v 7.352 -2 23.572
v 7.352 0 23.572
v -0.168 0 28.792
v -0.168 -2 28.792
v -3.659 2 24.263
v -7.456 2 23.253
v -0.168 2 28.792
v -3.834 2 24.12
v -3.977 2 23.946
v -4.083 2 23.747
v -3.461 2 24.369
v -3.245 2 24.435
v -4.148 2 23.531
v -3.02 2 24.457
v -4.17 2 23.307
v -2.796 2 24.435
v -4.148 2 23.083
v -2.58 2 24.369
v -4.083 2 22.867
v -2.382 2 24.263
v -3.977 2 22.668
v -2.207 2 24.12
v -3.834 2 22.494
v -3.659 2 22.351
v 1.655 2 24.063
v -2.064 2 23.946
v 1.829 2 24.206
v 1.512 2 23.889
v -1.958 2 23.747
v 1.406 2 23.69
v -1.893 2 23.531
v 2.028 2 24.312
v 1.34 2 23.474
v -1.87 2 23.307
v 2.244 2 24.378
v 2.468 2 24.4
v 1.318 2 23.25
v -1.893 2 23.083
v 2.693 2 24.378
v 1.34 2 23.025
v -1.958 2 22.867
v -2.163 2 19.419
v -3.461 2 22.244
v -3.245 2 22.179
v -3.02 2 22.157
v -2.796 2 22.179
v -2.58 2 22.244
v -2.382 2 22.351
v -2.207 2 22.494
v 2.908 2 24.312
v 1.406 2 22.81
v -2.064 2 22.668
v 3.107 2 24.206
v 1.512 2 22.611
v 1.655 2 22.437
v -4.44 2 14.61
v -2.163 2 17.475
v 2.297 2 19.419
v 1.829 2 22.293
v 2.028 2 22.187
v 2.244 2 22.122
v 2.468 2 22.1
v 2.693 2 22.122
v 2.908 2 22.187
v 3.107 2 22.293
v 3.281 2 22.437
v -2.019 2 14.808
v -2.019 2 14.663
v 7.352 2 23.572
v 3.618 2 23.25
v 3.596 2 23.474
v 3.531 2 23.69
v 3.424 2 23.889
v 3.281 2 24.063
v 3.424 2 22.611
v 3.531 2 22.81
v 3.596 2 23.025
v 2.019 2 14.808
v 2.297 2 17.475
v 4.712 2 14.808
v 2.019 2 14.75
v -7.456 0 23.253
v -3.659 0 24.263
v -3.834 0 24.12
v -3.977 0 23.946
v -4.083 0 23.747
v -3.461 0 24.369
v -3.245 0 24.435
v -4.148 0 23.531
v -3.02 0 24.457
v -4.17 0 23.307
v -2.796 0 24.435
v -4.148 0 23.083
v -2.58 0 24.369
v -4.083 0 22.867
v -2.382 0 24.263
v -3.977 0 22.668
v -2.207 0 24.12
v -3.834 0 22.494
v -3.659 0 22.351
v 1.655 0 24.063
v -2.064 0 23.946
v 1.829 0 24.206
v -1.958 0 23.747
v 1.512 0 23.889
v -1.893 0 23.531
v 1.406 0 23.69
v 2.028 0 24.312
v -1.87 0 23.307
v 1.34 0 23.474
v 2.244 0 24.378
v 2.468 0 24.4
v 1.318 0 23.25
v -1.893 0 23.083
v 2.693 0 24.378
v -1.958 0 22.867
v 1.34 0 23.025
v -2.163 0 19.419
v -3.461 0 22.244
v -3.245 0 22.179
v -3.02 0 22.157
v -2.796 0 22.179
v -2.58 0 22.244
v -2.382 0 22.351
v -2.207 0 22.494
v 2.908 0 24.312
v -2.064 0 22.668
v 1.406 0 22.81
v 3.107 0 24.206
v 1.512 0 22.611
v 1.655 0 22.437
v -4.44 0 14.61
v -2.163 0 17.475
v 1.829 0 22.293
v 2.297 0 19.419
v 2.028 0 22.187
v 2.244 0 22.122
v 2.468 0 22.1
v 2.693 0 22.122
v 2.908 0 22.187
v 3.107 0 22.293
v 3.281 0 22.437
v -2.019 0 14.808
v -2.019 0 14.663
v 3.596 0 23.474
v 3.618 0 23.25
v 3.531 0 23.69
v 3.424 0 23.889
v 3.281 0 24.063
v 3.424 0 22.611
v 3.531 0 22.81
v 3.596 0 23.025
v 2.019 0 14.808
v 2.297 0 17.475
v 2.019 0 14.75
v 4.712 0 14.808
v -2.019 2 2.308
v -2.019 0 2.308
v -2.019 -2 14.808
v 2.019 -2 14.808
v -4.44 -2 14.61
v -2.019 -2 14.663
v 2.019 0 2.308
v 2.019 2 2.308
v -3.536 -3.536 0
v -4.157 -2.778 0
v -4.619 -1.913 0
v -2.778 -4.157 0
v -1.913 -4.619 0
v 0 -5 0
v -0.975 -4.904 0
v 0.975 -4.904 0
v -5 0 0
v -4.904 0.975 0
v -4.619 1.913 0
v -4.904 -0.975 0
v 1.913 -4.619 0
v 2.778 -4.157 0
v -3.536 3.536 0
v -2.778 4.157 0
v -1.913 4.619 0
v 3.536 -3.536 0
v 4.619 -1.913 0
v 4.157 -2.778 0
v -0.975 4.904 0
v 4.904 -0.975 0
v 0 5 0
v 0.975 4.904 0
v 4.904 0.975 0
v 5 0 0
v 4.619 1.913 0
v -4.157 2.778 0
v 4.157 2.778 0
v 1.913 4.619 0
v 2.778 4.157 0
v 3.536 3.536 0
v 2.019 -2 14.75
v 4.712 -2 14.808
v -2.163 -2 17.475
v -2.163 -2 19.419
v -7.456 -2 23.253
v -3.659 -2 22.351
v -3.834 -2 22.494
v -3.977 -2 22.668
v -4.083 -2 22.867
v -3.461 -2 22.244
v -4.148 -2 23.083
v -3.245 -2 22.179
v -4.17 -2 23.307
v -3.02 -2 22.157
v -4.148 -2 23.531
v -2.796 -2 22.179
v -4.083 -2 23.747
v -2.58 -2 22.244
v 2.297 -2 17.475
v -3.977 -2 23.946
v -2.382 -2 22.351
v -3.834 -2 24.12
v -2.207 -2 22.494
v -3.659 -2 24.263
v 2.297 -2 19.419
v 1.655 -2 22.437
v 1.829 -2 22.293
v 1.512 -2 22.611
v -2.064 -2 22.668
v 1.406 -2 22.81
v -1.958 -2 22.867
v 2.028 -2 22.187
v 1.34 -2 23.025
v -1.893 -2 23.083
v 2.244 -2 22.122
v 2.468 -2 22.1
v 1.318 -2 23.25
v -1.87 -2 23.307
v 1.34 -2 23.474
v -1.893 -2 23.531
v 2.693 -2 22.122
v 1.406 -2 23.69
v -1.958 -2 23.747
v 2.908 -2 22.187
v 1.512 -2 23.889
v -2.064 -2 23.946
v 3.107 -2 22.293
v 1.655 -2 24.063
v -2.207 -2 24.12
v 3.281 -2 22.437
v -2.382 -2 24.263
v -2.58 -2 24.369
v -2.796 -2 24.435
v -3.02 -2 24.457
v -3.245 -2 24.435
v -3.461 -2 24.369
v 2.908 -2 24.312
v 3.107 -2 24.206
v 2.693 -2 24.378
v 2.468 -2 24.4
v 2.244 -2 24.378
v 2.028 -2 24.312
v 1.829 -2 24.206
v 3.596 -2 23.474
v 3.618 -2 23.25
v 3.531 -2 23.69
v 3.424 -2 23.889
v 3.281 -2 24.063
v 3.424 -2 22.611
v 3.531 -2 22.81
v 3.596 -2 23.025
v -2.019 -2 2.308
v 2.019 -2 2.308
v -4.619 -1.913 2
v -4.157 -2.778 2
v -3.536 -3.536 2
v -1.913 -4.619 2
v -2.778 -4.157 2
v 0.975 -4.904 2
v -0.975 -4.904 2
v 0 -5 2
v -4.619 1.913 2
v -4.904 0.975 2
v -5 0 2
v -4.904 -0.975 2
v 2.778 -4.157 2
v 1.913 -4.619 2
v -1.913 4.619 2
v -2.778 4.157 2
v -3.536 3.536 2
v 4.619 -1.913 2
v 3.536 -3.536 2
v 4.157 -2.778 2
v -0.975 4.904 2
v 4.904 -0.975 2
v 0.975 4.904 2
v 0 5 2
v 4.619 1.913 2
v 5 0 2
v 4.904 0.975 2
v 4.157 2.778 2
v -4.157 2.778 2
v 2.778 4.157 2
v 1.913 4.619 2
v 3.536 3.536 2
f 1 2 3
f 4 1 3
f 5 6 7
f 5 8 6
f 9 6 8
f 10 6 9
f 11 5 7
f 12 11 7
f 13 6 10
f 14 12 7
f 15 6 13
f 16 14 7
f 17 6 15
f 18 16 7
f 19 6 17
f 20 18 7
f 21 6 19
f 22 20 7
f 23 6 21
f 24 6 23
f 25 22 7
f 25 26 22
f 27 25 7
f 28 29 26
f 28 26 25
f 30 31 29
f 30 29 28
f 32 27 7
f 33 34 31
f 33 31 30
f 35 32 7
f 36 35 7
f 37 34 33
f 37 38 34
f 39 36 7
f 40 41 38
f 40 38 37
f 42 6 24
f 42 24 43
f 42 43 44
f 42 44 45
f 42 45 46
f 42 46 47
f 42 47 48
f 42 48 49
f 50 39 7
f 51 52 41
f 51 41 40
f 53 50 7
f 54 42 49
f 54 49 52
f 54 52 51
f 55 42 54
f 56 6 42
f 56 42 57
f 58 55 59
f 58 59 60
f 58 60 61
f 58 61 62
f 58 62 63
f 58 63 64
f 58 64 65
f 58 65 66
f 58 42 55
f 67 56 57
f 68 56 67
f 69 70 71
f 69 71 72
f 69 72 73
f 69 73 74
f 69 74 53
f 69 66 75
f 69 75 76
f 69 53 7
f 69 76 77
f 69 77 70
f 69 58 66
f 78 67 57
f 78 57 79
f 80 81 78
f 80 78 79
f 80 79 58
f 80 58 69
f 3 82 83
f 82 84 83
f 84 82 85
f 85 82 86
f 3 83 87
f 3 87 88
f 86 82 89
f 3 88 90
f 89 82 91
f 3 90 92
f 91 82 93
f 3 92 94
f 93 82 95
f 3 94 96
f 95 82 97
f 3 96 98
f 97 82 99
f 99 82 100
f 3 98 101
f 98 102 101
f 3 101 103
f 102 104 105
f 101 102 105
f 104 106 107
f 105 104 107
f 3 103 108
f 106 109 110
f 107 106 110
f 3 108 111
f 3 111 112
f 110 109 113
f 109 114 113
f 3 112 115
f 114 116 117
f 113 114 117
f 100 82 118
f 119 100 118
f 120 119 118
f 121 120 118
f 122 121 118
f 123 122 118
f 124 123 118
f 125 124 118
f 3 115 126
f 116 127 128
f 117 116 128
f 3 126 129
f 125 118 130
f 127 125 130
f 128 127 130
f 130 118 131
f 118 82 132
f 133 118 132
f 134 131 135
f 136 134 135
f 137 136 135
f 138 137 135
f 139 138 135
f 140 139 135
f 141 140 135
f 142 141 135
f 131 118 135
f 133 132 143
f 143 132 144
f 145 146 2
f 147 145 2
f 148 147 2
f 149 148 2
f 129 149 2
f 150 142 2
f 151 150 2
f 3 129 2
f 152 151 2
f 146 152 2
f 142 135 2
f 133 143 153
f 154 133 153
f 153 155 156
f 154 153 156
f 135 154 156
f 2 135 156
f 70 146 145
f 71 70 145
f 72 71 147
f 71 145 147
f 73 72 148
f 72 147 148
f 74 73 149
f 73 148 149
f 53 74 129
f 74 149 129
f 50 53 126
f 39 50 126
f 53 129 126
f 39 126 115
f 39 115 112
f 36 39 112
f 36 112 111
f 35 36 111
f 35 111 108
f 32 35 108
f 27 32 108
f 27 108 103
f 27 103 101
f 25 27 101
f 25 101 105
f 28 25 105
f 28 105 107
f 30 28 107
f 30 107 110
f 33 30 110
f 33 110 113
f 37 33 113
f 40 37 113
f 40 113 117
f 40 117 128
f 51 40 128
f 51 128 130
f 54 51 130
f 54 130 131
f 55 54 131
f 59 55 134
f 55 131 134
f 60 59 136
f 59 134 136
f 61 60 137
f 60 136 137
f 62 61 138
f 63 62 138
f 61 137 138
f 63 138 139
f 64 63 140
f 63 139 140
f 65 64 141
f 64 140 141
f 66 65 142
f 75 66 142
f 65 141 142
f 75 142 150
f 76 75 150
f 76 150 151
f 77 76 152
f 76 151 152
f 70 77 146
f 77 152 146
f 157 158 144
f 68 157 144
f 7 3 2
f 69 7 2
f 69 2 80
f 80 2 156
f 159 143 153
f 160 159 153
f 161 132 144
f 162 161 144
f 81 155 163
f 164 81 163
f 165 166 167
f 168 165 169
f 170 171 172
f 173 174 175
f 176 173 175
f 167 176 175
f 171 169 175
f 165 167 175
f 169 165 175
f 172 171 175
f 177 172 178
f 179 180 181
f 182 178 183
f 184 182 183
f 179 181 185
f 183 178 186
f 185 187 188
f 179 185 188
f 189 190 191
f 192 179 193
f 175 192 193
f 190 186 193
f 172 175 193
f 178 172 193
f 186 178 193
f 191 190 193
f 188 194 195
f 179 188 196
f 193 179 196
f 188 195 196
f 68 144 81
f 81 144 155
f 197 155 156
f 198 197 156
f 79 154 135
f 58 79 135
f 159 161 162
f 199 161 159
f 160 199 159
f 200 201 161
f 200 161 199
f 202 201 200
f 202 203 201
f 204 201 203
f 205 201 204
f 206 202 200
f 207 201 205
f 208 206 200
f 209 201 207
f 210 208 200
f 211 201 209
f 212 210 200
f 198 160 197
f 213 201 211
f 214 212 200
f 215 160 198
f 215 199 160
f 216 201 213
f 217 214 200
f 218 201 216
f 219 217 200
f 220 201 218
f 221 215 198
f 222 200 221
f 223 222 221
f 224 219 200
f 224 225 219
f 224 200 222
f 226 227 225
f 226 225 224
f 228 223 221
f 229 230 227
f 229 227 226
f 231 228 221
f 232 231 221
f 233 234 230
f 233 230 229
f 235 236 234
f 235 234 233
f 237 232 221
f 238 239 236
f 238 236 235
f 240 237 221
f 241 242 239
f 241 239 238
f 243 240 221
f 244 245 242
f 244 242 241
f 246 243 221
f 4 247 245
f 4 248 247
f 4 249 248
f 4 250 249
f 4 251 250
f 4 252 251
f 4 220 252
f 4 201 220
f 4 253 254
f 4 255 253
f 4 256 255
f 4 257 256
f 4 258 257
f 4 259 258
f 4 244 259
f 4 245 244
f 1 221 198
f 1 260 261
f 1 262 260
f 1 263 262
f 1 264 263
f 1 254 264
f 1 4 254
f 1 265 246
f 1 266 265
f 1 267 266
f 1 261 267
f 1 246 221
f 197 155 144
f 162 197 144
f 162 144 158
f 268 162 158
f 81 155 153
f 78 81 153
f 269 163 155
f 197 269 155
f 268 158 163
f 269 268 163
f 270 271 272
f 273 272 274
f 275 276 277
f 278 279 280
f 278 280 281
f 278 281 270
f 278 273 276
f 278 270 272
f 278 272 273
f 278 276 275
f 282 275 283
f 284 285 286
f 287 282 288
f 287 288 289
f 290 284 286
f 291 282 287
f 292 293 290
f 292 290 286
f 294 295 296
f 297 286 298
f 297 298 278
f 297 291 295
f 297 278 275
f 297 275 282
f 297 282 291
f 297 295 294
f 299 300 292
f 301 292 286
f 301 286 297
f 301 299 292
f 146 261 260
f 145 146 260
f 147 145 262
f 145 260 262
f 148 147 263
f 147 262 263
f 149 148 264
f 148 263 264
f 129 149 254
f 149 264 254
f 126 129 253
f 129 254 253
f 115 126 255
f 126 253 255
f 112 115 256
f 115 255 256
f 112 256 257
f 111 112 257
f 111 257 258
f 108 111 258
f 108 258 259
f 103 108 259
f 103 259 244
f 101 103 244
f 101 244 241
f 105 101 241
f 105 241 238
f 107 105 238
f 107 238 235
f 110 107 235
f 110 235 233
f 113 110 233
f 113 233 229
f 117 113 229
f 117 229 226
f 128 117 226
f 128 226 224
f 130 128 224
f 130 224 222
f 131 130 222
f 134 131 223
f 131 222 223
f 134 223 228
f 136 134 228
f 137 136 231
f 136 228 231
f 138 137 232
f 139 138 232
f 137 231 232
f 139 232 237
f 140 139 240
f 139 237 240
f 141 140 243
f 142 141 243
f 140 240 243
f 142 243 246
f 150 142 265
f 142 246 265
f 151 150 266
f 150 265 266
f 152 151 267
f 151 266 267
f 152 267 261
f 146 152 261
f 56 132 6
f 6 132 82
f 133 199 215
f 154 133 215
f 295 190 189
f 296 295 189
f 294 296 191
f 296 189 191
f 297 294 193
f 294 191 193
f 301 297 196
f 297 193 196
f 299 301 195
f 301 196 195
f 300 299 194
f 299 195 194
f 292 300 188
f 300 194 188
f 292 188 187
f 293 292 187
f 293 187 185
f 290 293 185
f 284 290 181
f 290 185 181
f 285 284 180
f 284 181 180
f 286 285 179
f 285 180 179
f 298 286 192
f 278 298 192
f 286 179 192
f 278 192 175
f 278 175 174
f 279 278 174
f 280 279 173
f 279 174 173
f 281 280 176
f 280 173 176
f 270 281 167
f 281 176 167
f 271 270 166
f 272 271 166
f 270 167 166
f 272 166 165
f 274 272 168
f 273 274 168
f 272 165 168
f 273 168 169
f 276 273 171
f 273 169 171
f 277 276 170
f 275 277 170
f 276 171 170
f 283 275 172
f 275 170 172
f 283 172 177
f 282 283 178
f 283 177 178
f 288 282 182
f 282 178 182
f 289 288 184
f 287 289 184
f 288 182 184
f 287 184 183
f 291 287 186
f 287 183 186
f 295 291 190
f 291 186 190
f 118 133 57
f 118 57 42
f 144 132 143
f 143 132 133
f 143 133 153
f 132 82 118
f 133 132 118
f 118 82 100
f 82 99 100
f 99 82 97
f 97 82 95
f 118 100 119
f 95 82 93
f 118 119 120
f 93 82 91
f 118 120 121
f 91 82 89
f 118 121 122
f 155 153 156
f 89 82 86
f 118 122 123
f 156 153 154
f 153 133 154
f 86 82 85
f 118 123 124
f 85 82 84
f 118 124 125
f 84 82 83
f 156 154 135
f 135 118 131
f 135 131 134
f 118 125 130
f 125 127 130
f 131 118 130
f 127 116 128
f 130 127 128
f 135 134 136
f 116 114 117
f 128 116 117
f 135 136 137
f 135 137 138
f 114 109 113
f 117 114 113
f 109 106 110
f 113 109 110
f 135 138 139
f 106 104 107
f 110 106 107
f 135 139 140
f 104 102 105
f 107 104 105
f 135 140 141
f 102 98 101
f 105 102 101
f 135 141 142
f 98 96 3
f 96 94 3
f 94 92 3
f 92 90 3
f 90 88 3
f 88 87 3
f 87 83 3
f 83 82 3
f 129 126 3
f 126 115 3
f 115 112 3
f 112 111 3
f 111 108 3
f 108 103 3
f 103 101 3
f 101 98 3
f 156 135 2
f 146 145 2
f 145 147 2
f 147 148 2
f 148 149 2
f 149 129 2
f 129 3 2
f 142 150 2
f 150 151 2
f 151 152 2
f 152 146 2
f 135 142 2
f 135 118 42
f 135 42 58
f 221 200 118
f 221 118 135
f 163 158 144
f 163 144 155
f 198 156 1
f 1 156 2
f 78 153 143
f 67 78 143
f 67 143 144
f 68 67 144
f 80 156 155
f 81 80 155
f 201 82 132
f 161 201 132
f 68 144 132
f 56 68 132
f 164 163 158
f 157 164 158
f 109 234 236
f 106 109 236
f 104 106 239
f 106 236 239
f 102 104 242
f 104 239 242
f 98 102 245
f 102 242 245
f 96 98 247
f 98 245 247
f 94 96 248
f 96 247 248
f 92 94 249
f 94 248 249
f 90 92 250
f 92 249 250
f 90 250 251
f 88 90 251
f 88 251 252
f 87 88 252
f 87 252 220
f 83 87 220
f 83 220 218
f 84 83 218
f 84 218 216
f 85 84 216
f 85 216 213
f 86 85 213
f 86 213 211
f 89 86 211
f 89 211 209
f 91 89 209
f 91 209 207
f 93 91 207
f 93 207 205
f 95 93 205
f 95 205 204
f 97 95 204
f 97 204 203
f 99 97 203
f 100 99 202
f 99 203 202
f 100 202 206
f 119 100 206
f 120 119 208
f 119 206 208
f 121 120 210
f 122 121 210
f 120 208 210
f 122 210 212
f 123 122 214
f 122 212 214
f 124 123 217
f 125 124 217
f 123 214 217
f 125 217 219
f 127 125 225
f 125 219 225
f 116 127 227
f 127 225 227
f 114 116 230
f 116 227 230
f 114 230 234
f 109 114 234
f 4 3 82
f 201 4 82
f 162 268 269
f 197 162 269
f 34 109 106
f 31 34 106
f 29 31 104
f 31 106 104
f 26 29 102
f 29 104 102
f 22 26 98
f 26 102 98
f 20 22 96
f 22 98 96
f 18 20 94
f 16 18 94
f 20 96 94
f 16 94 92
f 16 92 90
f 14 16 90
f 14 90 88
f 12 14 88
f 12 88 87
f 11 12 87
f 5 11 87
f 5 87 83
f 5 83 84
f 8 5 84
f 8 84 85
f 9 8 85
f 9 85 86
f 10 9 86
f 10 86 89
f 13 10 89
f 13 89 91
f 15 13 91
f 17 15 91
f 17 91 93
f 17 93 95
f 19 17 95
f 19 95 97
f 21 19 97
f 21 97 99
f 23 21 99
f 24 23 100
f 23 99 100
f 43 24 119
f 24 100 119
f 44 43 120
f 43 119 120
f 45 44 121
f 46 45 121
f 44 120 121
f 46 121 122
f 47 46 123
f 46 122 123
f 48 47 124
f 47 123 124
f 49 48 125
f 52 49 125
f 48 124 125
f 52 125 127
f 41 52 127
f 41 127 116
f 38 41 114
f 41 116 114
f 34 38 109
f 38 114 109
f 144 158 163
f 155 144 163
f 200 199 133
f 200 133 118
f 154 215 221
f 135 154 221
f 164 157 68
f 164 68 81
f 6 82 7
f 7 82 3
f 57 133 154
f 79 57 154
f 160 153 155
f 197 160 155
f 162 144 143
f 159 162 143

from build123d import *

# Parameters (mm, degrees)
F0_R     = 5
F1_DEPTH = 2
F3_DEPTH = 2
F4_DEPTH = 2
F5_R     = 1.15
F5_W     = 4.459527
F5_H     = 1.943896
F6_DEPTH = 4


with BuildPart() as f1:
    # F0 (on Top) → F1 (new body)
    with BuildSketch(Plane.XY):
        Circle(F0_R)
    extrude(amount=F1_DEPTH)


with BuildPart() as f3:
    # F2 (on Front) → F3 (new body)
    with BuildSketch(Plane.XZ):
        Polygon((2.01923, 14.749647), (-2.01923, 14.662579), (-2.01923, 2.307692), (2.01923, 2.307692), align=None)
        Polygon((-2.01923, 14.662579), (-2.01923, 14.807693), (2.01923, 14.807693), (2.01923, 14.749647), (4.711538, 14.807693), (7.351862, 23.572266), (-0.167837, 28.791766), (-7.455591, 23.25302), (-4.439971, 14.610388), align=None)
    extrude(amount=F3_DEPTH)


with BuildPart() as f4:
    # F3_face (on face) → F4 (new body)
    with BuildSketch(Plane(origin=(0.002363, 0, 8.506928), x_dir=(1, 0, 0), z_dir=(0, 1, 0))):
        Polygon((2.016867, -6.242719), (2.016867, 6.199236), (-2.021594, 6.199236), (-2.021594, -6.155651), align=None)
        Polygon((-2.021594, -6.155651), (-4.442335, -6.10346), (-7.457955, -14.746092), (-0.170201, -20.284837), (7.349499, -15.065338), (4.709175, -6.300765), (2.016867, -6.242719), (2.016867, -6.300765), (-2.021594, -6.300765), align=None)
    extrude(amount=F4_DEPTH)


with BuildPart() as f6_tool:
    # F5 (on face) → F6 (new body)
    with BuildSketch(Plane.XZ.offset(2)):
        with Locations((-3.020453, 23.30686)):
            Circle(F5_R)
        with Locations((2.468196, 23.249686)):
            Circle(F5_R)
        with Locations((0.066912, 18.447119)):
            Rectangle(F5_W, F5_H)
    extrude(amount=-F6_DEPTH)


with BuildPart() as f3_1:
    add(f3.part)

    # F6: cut by f6_tool
    add(f6_tool.part, mode=Mode.SUBTRACT)


with BuildPart() as f4_1:
    add(f4.part)

    # F6: cut by f6_tool
    add(f6_tool.part, mode=Mode.SUBTRACT)


solid = Compound([f1.part, f3_1.part, f4_1.part])
